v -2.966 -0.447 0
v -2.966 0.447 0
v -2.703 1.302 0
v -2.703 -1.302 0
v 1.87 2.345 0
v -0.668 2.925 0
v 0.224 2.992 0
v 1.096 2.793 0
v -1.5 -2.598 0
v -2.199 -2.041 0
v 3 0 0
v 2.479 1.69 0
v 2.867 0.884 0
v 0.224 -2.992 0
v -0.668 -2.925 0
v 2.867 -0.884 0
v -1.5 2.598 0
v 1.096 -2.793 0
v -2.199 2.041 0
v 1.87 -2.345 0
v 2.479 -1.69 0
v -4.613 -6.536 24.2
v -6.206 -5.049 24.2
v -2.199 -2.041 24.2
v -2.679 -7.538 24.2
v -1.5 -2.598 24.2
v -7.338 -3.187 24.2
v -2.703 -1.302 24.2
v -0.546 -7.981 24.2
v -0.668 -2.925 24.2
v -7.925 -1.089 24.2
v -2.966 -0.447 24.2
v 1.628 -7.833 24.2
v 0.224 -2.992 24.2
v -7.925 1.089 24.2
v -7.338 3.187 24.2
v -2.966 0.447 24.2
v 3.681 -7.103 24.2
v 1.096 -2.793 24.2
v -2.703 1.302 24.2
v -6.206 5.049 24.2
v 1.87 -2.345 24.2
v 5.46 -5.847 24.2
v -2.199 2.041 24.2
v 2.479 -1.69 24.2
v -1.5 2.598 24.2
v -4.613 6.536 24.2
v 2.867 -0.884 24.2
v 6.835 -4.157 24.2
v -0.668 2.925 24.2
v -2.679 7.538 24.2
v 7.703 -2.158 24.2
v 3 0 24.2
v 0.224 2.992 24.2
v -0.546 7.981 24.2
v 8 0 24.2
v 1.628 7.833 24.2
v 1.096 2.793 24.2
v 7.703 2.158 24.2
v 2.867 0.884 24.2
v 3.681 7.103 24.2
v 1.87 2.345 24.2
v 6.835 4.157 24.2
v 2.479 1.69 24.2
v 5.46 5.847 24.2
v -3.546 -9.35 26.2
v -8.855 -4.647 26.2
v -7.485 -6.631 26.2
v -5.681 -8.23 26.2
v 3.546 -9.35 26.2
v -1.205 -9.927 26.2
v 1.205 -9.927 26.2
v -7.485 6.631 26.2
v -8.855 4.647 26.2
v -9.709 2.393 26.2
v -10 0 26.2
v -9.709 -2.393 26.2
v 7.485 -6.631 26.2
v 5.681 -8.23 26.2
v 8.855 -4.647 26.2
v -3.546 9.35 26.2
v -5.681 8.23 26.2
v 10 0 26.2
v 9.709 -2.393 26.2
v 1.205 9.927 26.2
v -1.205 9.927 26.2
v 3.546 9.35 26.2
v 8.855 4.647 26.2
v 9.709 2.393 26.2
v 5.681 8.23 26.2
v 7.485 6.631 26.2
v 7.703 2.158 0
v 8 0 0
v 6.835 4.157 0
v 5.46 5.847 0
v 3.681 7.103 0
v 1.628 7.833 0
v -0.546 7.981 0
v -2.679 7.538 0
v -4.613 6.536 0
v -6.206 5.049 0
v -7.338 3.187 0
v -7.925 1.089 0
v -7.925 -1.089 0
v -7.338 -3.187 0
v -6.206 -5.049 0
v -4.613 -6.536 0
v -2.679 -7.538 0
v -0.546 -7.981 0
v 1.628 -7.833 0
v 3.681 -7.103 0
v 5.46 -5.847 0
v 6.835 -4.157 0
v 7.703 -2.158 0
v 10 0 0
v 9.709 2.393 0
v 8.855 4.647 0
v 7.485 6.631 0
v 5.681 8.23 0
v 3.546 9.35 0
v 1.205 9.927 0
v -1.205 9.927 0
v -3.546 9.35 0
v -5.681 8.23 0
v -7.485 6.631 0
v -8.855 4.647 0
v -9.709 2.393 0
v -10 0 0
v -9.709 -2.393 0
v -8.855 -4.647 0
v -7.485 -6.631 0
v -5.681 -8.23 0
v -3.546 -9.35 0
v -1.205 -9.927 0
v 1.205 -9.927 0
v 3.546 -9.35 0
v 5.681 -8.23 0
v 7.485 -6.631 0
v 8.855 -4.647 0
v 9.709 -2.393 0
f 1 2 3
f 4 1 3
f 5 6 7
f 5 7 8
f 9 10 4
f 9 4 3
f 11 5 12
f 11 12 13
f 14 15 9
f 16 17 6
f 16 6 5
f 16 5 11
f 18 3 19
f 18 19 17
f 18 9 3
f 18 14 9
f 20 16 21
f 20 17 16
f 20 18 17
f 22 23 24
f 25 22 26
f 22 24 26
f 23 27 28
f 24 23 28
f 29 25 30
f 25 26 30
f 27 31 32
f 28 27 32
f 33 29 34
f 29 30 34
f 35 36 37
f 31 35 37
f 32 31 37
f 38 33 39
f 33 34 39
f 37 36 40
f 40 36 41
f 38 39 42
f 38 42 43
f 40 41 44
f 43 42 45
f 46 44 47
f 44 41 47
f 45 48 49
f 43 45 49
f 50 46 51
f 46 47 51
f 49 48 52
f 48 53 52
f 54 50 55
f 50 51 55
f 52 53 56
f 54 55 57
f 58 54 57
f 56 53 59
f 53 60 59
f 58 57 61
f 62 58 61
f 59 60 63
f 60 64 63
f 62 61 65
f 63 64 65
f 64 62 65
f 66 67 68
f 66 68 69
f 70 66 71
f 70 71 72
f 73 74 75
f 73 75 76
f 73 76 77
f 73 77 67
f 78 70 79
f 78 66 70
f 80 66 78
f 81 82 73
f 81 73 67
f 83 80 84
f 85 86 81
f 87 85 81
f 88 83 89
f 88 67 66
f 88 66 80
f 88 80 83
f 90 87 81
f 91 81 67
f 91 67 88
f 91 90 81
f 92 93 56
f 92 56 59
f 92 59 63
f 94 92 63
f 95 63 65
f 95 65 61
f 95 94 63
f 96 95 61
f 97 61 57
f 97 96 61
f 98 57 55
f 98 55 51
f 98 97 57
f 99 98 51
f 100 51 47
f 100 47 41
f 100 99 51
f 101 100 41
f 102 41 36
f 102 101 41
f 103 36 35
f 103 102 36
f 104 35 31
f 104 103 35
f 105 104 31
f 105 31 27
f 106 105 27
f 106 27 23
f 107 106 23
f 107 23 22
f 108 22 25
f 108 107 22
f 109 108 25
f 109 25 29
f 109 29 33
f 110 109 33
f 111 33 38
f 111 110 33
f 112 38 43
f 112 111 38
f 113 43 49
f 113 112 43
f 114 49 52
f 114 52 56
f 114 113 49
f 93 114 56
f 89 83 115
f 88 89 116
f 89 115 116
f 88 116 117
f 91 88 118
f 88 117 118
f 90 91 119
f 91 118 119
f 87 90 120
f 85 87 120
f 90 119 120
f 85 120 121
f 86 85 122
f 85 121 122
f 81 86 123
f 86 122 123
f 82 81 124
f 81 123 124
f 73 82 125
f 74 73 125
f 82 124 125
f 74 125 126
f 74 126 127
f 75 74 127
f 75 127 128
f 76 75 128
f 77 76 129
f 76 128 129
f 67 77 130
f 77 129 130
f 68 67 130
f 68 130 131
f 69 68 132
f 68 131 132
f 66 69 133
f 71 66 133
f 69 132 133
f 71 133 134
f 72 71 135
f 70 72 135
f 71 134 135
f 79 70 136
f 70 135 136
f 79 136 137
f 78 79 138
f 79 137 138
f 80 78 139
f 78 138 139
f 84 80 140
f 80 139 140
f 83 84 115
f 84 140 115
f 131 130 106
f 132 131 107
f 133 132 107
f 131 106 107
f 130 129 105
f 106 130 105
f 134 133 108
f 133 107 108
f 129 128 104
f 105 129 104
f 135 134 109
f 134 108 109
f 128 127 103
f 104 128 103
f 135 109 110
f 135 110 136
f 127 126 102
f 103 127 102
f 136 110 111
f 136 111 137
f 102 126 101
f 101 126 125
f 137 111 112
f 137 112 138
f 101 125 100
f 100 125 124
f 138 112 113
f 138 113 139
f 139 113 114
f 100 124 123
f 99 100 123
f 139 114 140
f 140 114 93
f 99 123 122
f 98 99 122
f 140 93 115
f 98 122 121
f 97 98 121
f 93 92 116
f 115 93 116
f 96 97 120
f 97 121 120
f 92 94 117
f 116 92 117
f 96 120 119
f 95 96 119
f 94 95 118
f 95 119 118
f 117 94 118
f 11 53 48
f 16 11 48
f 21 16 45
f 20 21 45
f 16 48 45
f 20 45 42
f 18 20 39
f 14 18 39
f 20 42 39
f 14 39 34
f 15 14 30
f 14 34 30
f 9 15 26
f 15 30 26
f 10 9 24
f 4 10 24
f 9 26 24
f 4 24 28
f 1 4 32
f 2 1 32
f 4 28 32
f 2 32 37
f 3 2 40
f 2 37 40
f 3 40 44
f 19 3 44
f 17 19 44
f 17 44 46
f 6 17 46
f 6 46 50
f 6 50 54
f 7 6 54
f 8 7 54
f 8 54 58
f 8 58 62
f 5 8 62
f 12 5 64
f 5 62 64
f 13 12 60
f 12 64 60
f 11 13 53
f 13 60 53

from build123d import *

# Parameters (mm, degrees)
SKETCH_1_R      = 10
SKETCH_1_R_2    = 8
EXTRUDE_1_DEPTH = 24.2
SKETCH_2_R      = 10
EXTRUDE_2_DEPTH = 2
SKETCH_3_R      = 3
EXTRUDE_3_DEPTH = 24.2


with BuildPart() as part:
    # 草图1 → 凸台-拉伸1 (new body)
    with BuildSketch(Plane.XY):
        Circle(SKETCH_1_R)
        Circle(SKETCH_1_R_2, mode=Mode.SUBTRACT)
    extrude(amount=EXTRUDE_1_DEPTH)

    # 草图2 → 凸台-拉伸2 (add)
    with BuildSketch(Plane.XY.offset(24.2)):
        Circle(SKETCH_2_R)
    extrude(amount=EXTRUDE_2_DEPTH)

    # 草图3 → 凸台-拉伸3 (add)
    with BuildSketch(Plane(origin=(0, 0, 24.2), x_dir=(-1, 0, 0), z_dir=(0, 0, -1))):
        with Locations(Location((0, 0, 0), (0, 0, 180))):
            Circle(SKETCH_3_R)
    extrude(amount=EXTRUDE_3_DEPTH)


solid = part.part
